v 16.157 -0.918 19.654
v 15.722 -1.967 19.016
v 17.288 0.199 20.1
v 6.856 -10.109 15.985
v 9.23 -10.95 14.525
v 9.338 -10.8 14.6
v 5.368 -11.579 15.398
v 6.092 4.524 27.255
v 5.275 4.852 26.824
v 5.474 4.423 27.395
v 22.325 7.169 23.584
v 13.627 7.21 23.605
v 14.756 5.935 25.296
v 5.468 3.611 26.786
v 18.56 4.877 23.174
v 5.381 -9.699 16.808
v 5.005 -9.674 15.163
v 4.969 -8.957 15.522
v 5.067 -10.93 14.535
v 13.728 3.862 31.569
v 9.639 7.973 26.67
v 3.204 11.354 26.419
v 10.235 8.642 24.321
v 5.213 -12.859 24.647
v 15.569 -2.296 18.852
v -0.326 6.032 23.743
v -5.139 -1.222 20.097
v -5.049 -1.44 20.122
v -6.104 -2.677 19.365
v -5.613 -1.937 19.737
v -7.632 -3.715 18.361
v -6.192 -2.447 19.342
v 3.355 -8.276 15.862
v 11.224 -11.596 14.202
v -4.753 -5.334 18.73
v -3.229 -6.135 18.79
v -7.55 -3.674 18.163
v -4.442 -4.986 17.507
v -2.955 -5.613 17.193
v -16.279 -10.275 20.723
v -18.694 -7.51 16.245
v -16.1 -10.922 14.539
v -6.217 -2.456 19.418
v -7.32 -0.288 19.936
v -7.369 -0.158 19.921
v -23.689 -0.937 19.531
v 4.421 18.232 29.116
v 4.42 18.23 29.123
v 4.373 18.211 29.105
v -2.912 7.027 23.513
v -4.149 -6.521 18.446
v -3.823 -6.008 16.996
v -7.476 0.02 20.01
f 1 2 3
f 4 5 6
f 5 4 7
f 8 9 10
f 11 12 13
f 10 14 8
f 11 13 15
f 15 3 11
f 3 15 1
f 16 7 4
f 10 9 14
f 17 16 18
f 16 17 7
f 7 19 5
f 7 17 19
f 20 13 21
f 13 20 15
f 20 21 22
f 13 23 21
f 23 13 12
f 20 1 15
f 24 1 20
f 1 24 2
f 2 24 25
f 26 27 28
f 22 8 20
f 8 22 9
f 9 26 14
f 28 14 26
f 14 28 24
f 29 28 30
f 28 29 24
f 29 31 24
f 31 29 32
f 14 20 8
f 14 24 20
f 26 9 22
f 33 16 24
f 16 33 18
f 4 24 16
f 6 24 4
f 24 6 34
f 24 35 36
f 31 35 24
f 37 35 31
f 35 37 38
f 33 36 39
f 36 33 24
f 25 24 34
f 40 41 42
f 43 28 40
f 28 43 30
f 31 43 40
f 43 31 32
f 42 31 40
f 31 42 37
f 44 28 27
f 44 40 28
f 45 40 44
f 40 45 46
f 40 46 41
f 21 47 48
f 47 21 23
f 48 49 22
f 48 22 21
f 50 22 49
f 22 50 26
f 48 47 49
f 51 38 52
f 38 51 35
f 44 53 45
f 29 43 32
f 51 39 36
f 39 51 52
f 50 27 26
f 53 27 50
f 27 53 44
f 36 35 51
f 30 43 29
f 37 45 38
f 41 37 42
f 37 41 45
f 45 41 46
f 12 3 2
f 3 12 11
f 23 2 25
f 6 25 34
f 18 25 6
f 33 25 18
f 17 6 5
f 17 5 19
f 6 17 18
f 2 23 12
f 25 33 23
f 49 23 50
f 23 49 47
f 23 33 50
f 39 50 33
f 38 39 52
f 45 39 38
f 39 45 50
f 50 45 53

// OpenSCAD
seed=rands(0,1000,1)[0];
planeCrop(  30,[0,1,2],[0,0,20] ) 
union() {
    for (t = [0: 5]) {
        r = rands(0, 360, 3,t+seed);
       c = rands(0, 1, 3);
     color(c)   rotate(r) cube(20);
    }
}


module crop(maxh = 100) {
    intersection() {
        color() {
            children();
        }
        linear_extrude(maxh)
        hull()
        projection() {
            children();
        }
    }
}

 module planeCrop(maxh = 100,normal,origin) {
  translate(origin)
     un_look_at( normal )
         crop(maxh)    
             look_at(normal)
               translate(-origin)
                    color() {
                        children();
                    }
               }
               
module planeCrop(maxh = 100,normal,origin) {
  translate(origin)
     un_look_at( normal )
         crop(maxh)    
             look_at(normal)
               translate(-origin)
                    color() {
                        children();
                    }
               }



module look_at(lookpoint,origin=[0,0,0],rotatefrom=[0,0,1]){
rotations=look_at(lookpoint,origin ,rotatefrom);
rotate(rotations[0],rotations[1]) children();
}
module un_look_at(lookpoint,origin=[0,0,0],rotatefrom=[0,0,1]){
rotations=look_at(lookpoint,origin ,rotatefrom);
rotate(-rotations[0],rotations[1]) children();
}

function look_at(p,o=[0,0,0],up=[0,0,1])=let(a=up,b=p-o,c=cross(a,b) ,d=angle(a,b))[d,c];

function angle (a,b)=atan2(sqrt((cross(a, b)*cross(a, b))), (a* b));
